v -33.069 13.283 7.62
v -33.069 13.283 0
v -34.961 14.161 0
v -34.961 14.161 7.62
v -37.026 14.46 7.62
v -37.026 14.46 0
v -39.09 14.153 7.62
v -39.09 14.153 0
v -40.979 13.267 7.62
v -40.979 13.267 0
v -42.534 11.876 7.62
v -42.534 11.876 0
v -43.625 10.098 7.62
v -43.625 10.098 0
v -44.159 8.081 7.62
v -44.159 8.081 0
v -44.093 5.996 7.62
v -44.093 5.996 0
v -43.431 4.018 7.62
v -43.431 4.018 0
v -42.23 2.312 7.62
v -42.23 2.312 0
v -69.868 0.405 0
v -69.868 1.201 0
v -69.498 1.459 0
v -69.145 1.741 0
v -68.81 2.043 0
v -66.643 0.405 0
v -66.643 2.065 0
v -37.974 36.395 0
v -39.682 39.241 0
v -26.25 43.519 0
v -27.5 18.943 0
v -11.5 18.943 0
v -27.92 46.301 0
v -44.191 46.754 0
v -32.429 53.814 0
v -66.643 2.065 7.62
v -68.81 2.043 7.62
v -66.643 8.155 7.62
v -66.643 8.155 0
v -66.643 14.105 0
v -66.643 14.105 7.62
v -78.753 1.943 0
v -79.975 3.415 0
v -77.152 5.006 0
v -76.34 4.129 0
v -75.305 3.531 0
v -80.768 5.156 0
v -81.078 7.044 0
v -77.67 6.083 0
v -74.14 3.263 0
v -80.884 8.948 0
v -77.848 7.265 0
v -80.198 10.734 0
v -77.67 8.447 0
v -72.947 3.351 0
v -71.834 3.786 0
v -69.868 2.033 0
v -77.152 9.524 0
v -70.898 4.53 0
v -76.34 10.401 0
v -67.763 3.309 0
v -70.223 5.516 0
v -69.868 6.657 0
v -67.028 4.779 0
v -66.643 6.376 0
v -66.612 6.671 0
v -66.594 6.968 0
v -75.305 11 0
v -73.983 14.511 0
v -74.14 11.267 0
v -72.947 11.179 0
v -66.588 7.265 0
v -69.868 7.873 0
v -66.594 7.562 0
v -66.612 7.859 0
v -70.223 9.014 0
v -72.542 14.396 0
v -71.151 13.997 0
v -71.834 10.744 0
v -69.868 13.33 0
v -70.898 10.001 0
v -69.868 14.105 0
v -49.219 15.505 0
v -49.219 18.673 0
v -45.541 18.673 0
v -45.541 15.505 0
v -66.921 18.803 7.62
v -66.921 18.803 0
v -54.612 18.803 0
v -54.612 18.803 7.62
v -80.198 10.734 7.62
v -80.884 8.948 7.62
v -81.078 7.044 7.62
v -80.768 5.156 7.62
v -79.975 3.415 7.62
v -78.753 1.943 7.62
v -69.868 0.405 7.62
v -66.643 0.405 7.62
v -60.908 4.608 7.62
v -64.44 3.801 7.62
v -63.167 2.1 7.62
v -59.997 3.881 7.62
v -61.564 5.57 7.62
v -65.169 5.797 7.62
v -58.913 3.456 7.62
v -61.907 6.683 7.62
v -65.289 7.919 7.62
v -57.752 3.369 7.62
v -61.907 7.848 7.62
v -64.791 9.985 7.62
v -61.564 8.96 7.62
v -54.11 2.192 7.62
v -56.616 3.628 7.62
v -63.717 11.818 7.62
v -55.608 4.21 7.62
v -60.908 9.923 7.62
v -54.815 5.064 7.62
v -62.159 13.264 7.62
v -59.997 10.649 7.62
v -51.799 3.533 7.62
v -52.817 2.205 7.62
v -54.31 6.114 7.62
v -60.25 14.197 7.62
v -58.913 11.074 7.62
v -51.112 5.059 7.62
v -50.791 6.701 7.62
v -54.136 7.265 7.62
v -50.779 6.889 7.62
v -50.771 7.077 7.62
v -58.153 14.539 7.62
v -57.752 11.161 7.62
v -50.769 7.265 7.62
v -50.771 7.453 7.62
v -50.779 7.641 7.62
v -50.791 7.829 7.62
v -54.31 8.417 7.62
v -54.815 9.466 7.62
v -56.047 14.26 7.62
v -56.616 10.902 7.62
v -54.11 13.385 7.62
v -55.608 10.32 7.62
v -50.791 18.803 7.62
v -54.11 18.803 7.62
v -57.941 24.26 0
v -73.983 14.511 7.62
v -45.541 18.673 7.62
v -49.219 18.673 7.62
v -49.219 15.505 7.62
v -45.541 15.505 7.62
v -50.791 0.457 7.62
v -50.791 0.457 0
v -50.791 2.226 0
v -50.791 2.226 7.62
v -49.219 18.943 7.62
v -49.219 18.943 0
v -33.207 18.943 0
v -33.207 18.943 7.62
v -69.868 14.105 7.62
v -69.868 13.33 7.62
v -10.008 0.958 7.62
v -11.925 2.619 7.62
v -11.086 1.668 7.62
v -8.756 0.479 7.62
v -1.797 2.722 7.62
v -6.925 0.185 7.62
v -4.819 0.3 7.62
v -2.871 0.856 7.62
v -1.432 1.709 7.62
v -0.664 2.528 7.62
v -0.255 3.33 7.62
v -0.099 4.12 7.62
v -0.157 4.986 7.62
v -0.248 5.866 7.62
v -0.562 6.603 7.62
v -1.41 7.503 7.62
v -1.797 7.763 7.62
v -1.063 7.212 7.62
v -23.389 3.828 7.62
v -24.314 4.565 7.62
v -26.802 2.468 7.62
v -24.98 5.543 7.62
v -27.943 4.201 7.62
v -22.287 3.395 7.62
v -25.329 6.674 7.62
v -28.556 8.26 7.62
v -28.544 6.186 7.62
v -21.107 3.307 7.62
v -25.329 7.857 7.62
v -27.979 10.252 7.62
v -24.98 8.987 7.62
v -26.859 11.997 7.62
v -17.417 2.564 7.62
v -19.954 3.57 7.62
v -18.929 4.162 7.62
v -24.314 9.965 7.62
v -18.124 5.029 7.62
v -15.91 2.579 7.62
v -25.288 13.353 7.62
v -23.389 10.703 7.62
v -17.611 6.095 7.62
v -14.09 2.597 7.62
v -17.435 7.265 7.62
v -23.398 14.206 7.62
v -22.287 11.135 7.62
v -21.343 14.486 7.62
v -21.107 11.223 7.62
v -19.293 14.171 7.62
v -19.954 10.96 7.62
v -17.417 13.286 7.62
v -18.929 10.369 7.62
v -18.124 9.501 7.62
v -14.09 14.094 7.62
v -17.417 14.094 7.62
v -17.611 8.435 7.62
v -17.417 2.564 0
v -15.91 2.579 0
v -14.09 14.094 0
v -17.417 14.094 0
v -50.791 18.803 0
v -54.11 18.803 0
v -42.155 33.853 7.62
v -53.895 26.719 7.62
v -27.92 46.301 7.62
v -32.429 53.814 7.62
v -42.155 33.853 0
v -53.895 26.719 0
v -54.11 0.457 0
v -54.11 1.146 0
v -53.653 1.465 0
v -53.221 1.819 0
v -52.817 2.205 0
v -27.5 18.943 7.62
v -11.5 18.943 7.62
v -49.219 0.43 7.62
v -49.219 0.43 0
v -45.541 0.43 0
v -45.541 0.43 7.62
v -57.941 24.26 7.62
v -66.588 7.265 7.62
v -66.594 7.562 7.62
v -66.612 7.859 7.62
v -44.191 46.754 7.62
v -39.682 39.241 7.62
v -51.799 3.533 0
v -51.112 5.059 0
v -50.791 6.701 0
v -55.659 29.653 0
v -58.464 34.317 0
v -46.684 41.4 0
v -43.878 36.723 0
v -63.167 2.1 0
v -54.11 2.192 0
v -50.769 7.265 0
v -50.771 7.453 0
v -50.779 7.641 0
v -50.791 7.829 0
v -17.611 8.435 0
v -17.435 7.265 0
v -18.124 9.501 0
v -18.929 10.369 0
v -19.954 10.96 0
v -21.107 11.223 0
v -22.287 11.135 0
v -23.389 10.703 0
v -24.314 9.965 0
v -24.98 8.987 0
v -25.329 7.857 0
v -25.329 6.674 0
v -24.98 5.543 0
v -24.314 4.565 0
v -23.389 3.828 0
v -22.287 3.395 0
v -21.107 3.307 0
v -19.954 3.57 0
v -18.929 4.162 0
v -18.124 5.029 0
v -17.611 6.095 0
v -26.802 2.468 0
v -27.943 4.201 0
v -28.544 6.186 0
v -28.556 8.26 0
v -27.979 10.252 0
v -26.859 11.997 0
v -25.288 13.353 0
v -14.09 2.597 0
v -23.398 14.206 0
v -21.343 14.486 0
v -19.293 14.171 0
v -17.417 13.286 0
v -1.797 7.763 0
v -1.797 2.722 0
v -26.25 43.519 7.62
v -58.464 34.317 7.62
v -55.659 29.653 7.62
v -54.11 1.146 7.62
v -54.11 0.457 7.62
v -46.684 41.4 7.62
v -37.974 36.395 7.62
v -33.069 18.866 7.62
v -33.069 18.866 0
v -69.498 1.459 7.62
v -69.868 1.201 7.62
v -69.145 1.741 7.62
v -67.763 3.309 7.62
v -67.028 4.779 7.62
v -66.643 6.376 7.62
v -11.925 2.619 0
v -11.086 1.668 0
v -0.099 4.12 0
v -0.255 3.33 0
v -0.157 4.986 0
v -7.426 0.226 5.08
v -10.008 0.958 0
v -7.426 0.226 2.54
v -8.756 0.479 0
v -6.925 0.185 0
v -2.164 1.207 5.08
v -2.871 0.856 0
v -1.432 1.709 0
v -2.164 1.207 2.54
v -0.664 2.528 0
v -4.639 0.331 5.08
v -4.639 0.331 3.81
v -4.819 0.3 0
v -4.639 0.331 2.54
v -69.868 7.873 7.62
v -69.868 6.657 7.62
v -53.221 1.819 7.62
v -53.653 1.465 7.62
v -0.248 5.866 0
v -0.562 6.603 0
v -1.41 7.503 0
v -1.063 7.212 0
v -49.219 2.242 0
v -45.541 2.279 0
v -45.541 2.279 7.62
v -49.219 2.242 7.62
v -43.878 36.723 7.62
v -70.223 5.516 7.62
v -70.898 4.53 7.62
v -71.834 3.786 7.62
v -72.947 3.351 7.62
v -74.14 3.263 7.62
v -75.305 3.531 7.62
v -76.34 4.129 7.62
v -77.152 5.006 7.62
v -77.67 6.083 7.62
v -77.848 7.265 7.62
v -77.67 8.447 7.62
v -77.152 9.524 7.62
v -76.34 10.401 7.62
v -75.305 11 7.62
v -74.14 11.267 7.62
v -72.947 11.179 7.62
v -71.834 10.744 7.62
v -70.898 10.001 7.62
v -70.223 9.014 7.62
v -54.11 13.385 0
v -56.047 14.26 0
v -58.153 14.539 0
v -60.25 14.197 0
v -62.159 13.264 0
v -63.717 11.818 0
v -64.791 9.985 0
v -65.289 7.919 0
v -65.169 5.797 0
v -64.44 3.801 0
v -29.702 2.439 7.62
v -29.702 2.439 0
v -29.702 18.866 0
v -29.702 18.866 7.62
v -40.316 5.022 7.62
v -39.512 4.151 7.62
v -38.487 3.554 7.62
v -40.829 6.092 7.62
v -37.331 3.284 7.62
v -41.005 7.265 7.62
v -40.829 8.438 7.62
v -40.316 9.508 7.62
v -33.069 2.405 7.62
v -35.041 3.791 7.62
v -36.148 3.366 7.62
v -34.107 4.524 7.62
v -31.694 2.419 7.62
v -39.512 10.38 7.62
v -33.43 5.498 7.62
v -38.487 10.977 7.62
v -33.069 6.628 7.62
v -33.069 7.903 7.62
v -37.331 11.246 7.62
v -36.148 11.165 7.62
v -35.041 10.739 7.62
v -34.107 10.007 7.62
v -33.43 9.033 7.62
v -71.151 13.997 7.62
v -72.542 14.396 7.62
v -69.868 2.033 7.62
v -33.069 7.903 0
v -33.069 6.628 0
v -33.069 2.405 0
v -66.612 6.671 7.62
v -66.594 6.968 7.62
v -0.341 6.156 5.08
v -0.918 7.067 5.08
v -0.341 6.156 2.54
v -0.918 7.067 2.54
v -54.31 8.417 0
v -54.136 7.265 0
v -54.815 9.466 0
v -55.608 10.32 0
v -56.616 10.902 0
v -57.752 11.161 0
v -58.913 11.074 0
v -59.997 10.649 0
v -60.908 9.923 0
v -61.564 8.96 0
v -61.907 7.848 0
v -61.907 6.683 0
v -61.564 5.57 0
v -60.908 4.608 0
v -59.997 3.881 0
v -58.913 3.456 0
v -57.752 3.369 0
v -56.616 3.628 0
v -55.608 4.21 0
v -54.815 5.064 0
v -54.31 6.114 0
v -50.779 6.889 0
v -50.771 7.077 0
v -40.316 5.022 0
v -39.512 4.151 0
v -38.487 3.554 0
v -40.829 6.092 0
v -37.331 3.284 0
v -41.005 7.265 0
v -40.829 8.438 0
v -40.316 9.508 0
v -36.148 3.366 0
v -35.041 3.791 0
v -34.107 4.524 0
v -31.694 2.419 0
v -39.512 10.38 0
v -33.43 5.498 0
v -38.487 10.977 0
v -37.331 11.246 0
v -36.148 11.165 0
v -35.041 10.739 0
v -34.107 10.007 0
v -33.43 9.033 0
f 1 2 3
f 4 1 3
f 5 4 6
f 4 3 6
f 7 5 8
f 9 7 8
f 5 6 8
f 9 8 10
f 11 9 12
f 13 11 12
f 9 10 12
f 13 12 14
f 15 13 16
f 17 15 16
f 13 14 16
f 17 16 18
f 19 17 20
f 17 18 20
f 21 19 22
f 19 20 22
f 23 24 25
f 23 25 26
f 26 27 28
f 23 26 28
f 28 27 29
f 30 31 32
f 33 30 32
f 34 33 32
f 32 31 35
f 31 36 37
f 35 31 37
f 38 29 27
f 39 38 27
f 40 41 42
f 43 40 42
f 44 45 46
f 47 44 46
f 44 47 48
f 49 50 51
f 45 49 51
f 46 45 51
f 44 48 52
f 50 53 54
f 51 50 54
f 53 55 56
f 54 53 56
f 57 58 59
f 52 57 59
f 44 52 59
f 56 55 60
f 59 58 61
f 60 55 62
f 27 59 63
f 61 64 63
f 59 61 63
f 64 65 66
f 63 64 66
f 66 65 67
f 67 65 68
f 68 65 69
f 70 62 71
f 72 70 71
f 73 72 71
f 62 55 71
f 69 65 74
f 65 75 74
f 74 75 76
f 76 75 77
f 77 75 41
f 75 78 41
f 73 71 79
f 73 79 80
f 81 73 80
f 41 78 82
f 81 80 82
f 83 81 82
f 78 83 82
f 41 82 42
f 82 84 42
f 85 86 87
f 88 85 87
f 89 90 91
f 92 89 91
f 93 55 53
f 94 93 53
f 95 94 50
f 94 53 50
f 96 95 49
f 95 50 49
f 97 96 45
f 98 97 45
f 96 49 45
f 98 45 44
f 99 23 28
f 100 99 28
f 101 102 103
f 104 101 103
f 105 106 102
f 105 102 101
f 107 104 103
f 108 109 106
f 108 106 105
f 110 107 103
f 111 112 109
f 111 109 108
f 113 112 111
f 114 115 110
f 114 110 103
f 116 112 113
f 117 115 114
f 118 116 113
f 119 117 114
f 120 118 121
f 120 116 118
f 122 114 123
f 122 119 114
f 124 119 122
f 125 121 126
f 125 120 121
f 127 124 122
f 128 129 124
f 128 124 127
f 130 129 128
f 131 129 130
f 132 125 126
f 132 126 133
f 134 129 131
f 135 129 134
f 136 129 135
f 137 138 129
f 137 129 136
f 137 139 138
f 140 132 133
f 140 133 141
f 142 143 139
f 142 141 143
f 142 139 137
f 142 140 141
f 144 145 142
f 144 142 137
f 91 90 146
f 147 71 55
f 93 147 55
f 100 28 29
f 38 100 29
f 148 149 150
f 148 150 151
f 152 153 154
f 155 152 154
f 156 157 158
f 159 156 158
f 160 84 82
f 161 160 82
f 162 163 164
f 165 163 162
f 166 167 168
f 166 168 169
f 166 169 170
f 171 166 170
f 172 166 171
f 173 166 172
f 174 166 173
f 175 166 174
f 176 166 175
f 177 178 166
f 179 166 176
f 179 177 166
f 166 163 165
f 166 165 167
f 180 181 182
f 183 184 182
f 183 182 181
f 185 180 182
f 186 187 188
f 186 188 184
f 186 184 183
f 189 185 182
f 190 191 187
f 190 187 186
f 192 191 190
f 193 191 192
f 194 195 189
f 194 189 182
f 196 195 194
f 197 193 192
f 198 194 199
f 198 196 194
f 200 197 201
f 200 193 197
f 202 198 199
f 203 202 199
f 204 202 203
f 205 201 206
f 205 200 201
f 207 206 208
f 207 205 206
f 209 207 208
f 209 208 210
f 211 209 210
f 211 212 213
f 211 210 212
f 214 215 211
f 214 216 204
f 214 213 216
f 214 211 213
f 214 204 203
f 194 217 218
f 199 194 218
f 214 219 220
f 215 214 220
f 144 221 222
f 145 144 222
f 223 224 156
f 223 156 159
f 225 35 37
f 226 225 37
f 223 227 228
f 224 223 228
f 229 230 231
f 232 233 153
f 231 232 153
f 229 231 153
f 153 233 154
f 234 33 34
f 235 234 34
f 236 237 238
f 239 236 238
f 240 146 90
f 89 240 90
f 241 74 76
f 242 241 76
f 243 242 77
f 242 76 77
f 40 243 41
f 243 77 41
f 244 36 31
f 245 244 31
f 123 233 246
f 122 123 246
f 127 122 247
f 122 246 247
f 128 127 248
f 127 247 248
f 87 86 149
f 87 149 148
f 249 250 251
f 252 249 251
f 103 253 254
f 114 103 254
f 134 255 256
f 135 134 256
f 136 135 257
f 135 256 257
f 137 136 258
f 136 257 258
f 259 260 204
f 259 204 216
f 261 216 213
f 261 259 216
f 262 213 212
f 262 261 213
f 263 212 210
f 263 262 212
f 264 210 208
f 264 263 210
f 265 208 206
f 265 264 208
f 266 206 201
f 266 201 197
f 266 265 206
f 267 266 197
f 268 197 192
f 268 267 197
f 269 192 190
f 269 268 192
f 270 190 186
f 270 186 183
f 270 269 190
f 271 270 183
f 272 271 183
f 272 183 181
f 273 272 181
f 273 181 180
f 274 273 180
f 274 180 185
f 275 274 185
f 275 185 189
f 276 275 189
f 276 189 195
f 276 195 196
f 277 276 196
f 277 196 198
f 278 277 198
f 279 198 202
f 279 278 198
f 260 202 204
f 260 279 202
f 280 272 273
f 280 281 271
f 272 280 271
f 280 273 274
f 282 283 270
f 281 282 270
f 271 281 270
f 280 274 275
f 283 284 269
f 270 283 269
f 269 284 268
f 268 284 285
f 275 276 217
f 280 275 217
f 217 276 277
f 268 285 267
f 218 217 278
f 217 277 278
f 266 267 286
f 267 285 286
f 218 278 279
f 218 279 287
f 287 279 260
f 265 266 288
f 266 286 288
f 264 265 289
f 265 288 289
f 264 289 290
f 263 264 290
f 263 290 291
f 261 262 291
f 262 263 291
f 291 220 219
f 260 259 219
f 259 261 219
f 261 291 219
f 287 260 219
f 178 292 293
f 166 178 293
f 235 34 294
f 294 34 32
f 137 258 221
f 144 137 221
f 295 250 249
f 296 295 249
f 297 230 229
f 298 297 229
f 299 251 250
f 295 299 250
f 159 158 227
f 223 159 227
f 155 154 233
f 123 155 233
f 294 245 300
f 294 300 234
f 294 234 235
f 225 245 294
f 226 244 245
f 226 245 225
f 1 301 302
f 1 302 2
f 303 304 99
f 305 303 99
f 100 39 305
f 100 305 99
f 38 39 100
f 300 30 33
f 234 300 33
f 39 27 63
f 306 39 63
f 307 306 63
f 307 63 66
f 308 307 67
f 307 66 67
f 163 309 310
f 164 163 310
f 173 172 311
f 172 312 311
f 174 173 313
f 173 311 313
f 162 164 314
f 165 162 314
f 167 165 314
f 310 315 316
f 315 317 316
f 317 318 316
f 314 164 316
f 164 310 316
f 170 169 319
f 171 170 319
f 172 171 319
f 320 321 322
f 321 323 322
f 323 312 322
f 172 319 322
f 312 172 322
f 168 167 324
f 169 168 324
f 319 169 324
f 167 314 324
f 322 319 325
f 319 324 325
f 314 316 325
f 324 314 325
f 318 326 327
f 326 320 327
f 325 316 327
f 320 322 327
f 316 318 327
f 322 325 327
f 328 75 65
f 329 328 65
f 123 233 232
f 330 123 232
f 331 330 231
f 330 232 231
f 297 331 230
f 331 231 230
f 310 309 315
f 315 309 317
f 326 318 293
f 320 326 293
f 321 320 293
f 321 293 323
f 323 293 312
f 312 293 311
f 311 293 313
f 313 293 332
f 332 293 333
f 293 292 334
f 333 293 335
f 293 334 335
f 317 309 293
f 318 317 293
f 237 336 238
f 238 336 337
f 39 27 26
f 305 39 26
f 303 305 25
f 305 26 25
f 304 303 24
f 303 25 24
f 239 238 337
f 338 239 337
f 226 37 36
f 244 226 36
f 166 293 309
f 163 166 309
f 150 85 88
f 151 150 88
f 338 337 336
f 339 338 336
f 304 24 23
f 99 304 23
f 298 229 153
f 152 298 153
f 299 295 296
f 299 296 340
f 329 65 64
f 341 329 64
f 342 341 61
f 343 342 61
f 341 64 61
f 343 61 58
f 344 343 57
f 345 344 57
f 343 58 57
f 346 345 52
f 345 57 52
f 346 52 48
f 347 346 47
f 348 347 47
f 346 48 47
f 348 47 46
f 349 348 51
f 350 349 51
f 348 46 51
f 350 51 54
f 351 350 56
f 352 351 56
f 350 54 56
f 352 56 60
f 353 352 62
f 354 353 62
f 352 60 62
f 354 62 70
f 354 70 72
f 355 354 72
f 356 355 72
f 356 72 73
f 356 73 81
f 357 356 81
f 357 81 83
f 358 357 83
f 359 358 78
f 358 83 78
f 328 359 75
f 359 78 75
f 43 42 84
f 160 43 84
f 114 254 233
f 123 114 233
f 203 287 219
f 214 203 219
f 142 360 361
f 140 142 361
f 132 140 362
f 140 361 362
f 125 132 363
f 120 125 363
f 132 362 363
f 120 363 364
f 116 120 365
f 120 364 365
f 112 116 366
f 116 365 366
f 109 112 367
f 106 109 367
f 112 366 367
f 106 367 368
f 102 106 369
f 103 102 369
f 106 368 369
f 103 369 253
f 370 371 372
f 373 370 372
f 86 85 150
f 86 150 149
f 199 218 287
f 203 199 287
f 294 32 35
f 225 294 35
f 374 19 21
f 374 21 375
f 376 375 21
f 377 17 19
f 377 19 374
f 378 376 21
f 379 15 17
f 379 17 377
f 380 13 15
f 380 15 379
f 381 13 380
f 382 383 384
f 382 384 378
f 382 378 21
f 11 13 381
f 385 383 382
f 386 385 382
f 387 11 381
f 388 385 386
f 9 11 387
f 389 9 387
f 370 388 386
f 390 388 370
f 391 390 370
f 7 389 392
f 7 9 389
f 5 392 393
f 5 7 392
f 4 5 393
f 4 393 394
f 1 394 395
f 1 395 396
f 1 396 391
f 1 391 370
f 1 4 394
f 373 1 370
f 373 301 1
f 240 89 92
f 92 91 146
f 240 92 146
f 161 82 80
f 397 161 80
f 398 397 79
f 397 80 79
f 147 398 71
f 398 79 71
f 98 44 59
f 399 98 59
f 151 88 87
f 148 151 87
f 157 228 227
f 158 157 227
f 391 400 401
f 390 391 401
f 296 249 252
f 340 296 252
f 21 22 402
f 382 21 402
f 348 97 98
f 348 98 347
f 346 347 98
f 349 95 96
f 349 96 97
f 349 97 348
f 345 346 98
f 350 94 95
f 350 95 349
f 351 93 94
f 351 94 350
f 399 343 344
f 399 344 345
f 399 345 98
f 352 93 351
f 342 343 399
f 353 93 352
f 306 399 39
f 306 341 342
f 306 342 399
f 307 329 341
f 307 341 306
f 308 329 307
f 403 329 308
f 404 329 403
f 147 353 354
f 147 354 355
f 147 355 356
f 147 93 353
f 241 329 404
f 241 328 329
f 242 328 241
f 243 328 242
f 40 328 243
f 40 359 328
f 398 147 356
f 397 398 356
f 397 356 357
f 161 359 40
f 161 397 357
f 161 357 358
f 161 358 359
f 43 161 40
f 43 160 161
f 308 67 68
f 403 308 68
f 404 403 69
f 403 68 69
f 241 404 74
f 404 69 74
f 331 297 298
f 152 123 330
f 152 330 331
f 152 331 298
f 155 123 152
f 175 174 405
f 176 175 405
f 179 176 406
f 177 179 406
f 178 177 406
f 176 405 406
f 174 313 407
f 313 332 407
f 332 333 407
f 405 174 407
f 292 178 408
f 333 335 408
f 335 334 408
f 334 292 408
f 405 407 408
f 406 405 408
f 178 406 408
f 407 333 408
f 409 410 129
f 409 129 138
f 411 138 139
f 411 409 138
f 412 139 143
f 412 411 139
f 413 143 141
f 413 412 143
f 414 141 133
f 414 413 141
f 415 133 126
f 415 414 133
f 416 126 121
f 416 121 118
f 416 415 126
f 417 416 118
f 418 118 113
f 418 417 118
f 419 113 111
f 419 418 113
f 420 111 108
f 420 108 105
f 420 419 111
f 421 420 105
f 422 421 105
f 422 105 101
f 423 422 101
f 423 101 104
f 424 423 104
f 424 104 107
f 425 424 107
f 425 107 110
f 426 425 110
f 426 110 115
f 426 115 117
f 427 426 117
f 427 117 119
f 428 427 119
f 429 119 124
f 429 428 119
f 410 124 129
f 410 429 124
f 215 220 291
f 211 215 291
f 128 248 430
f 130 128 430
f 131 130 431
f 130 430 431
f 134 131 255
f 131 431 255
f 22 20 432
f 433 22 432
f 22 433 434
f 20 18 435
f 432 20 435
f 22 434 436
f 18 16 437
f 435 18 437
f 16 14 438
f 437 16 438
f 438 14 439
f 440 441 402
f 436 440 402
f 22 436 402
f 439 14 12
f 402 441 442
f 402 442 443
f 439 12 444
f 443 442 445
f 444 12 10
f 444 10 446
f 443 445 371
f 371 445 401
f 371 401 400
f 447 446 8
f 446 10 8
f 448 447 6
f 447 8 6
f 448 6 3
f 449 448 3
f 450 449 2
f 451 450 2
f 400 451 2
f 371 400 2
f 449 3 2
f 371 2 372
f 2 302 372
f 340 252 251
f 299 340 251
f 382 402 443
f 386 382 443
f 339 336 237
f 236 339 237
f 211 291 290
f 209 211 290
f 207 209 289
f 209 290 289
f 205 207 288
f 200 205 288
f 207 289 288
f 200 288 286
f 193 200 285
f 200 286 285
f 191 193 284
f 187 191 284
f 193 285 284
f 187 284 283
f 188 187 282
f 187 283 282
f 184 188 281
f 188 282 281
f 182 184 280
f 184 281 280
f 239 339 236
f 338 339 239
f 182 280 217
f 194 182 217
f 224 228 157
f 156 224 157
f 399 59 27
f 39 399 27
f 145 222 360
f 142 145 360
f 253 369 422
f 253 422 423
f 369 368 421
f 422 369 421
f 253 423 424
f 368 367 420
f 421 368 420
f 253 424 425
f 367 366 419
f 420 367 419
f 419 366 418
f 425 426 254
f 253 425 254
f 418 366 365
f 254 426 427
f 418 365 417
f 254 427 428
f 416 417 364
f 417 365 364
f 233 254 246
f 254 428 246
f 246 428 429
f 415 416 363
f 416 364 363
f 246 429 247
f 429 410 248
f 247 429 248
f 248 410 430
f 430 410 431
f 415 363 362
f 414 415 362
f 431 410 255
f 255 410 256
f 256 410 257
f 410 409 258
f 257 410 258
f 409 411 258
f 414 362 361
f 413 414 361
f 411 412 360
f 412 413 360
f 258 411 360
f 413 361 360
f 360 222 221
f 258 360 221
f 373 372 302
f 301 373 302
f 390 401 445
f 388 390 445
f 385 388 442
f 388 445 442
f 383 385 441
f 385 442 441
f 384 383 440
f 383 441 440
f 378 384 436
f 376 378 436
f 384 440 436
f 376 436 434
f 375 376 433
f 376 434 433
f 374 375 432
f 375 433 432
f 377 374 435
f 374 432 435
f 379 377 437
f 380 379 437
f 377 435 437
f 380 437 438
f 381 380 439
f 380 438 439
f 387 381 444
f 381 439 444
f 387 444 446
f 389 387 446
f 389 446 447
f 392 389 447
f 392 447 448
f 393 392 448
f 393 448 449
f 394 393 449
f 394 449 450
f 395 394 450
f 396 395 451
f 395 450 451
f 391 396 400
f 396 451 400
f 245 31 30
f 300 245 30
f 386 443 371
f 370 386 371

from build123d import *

# Parameters (mm, degrees)
F1_DEPTH = 7.62
F0_R     = 3.9071612502
F0_R_2   = 3.9693222288
F0_W     = 3.6783010967
F0_H     = 3.1684441492


with BuildPart() as f1:
    # F0 (on Top) → F1 (new body)
    with BuildSketch(Plane.XY):
        Polygon((-54.6120963991, 18.8028495759), (-57.9414791113, 24.2596925711), (-66.9205742951, 18.8028495759), align=None)
    extrude(amount=F1_DEPTH)


with BuildPart() as f1b:
    # F0 (on Top) → F1, piece 2 (new body)
    with BuildSketch(Plane.XY):
        Polygon((-58.4635436535, 34.3171171844), (-55.6590456115, 29.6528524318), (-43.8780021033, 36.7234046998), (-46.6844625771, 41.399564594), align=None)
    extrude(amount=F1_DEPTH)


with BuildPart() as f1c:
    # F0 (on Top) → F1, piece 3 (new body)
    with BuildSketch(Plane.XY):
        Polygon((-42.1554631157, 33.8532884785), (-53.8949323829, 26.718890265), (-49.2192299373, 18.9425560391), (-33.2065857947, 18.9425560391), align=None)
    extrude(amount=F1_DEPTH)


with BuildPart() as f1d:
    # F0 (on Top) → F1, piece 4 (new body)
    with BuildSketch(Plane.XY):
        with BuildLine():
            ThreePointArc((-69.8677301407, 13.3297108985), (-71.8363877974, 14.2310348582), (-73.9834488266, 14.5105465515))
            Line((-73.9834488266, 14.5105465515), (-80.197720877, 10.7339625846))
            ThreePointArc((-80.197720877, 10.7339625846), (-80.9859151306, 6.0900592734), (-78.7530233725, 1.9426163816))
            Line((-78.7530233725, 1.9426163816), (-69.8677301407, 2.0325591908))
            Line((-69.8677301407, 2.0325591908), (-69.8677301407, 6.657484785))
            ThreePointArc((-69.8677301407, 6.657484785), (-77.8484436742, 7.2651901282), (-69.8677301407, 7.8728954714))
            Line((-69.8677301407, 7.8728954714), (-69.8677301407, 13.3297108985))
        make_face()
        with BuildLine():
            Line((-69.8677301407, 14.1047984362), (-69.8677301407, 13.3297108985))
            ThreePointArc((-69.8677301407, 13.3297108985), (-67.6845522307, 11.0979247886), (-66.6428804398, 8.1547878725))
            Line((-66.6428804398, 8.1547878725), (-66.6428804398, 14.1047984362))
            Line((-66.6428804398, 14.1047984362), (-69.8677301407, 14.1047984362))
        make_face()
        with BuildLine():
            ThreePointArc((-66.6428804398, 8.1547878725), (-67.6845522307, 11.0979247886), (-69.8677301407, 13.3297108985))
            Line((-69.8677301407, 13.3297108985), (-69.8677301407, 7.8728954714))
            ThreePointArc((-69.8677301407, 7.8728954714), (-69.833040775, 7.5699224451), (-69.821455358, 7.2651901282))
            ThreePointArc((-69.821455358, 7.2651901282), (-69.833040775, 6.9604578114), (-69.8677301407, 6.657484785))
            Line((-69.8677301407, 6.657484785), (-69.8677301407, 2.0325591908))
            Line((-69.8677301407, 2.0325591908), (-68.810137273, 2.0432648447))
            ThreePointArc((-68.810137273, 2.0432648447), (-67.3537989415, 4.0229796207), (-66.6428804398, 6.375592384))
            Line((-66.6428804398, 6.375592384), (-66.6428804398, 8.1547878725))
        make_face()
        with BuildLine():
            ThreePointArc((-66.5880714472, 7.2651901282), (-66.6017866739, 7.7108324097), (-66.6428804398, 8.1547878725))
            Line((-66.6428804398, 8.1547878725), (-66.6428804398, 6.375592384))
            ThreePointArc((-66.6428804398, 6.375592384), (-66.6017866739, 6.8195478467), (-66.5880714472, 7.2651901282))
        make_face()
        with BuildLine():
            ThreePointArc((-69.821455358, 7.2651901282), (-69.833040775, 7.5699224451), (-69.8677301407, 7.8728954714))
            Line((-69.8677301407, 7.8728954714), (-69.8677301407, 6.657484785))
            ThreePointArc((-69.8677301407, 6.657484785), (-69.833040775, 6.9604578114), (-69.821455358, 7.2651901282))
        make_face()
    extrude(amount=F1_DEPTH)


with BuildPart() as f1e:
    # F0 (on Top) → F1, piece 5 (new body)
    with BuildSketch(Plane.XY):
        Polygon((-27.9197386264, 46.3009719113), (-39.6823539035, 39.2414795949), (-37.9737712473, 36.3946175894), (-26.25028293, 43.5193037403), align=None)
        Polygon((-44.1911518574, 46.7540957034), (-39.6823539035, 39.2414795949), (-27.9197386264, 46.3009719113), (-32.4285365804, 53.8135880197), align=None)
        Polygon((-26.25028293, 43.5193037403), (-37.9737712473, 36.3946175894), (-27.4996809606, 18.9425560391), (-11.5002160892, 18.9425560391), align=None)
    extrude(amount=F1_DEPTH)


with BuildPart() as f1f:
    # F0 (on Top) → F1, piece 6 (new body)
    with BuildSketch(Plane.XY):
        with BuildLine():
            ThreePointArc((-54.1104190052, 13.3848092535), (-63.7170999248, 11.8183650375), (-63.1665728512, 2.1003927329))
            Line((-63.1665728512, 2.1003927329), (-54.1104190052, 2.1920651062))
            Line((-54.1104190052, 2.1920651062), (-54.1104190052, 13.3848092535))
        make_face()
        with Locations((-58.0436183297, 7.2651901282)):
            Circle(F0_R, mode=Mode.SUBTRACT)
        with BuildLine():
            Line((-54.1104190052, 18.8028495759), (-54.1104190052, 13.3848092535))
            ThreePointArc((-54.1104190052, 13.3848092535), (-51.7988275156, 10.9964610717), (-50.790913403, 7.8291638969))
            Line((-50.790913403, 7.8291638969), (-50.790913403, 18.8028495759))
            Line((-50.790913403, 18.8028495759), (-54.1104190052, 18.8028495759))
        make_face()
        with BuildLine():
            ThreePointArc((-50.790913403, 7.8291638969), (-51.7988275156, 10.9964610717), (-54.1104190052, 13.3848092535))
            Line((-54.1104190052, 13.3848092535), (-54.1104190052, 2.1920651062))
            Line((-54.1104190052, 2.1920651062), (-52.8171613103, 2.2051563151))
            ThreePointArc((-52.8171613103, 2.2051563151), (-51.4114233914, 4.276246257), (-50.790913403, 6.7012163595))
            Line((-50.790913403, 6.7012163595), (-50.790913403, 7.8291638969))
        make_face()
        with BuildLine():
            ThreePointArc((-50.7690190167, 7.2651901282), (-50.7744946741, 7.5473894266), (-50.790913403, 7.8291638969))
            Line((-50.790913403, 7.8291638969), (-50.790913403, 6.7012163595))
            ThreePointArc((-50.790913403, 6.7012163595), (-50.7744946741, 6.9829908299), (-50.7690190167, 7.2651901282))
        make_face()
    extrude(amount=F1_DEPTH)


with BuildPart() as f1g:
    # F0 (on Top) → F1, piece 7 (new body)
    with BuildSketch(Plane.XY):
        with BuildLine():
            ThreePointArc((-52.8171613103, 2.2051563151), (-53.433248893, 1.6380870705), (-54.1104190052, 1.145571003))
            Line((-54.1104190052, 1.145571003), (-54.1104190052, 0.4571469035))
            Line((-54.1104190052, 0.4571469035), (-50.790913403, 0.4571469035))
            Line((-50.790913403, 0.4571469035), (-50.790913403, 2.2256673353))
            Line((-50.790913403, 2.2256673353), (-52.8171613103, 2.2051563151))
        make_face()
    extrude(amount=F1_DEPTH)


with BuildPart() as f1h:
    # F0 (on Top) → F1, piece 8 (new body)
    with BuildSketch(Plane.XY):
        with BuildLine():
            ThreePointArc((-68.810137273, 2.0432648447), (-69.319238061, 1.5972458978), (-69.8677301407, 1.200669358))
            Line((-69.8677301407, 1.200669358), (-69.8677301407, 0.4053486628))
            Line((-69.8677301407, 0.4053486628), (-66.6428804398, 0.4053486628))
            Line((-66.6428804398, 0.4053486628), (-66.6428804398, 2.0652032504))
            Line((-66.6428804398, 2.0652032504), (-68.810137273, 2.0432648447))
        make_face()
    extrude(amount=F1_DEPTH)


with BuildPart() as f1i:
    # F0 (on Top) → F1, piece 9 (new body)
    with BuildSketch(Plane.XY):
        Polygon((-45.5409288406, 2.2788111481), (-49.2192299373, 2.2415769539), (-49.2192299373, 0.4300079017), (-45.5409288406, 0.4300079017), align=None)
    extrude(amount=F1_DEPTH)


with BuildPart() as f1j:
    # F0 (on Top) → F1, piece 10 (new body)
    with BuildSketch(Plane.XY):
        with BuildLine():
            add(Edge.make_bspline(
                [(-0.1574168564, 4.985621199), (-0.1131827791, 6.2999939449), (-0.7987933683, 7.1600216499), (-1.7971183406, 7.7627462702)],
                knots=[0, 0, 0, 0, 2.8581671617, 2.8581671617, 2.8581671617, 2.8581671617], degree=3))
            Line((-1.7971183406, 7.7627462702), (-1.7971183406, 2.7216149028))
            Line((-1.7971183406, 2.7216149028), (-11.9253362085, 2.6190903891))
            add(Edge.make_bspline(
                [(-11.9253362085, 2.6190903891), (-9.1467564623, -1.6533627287), (0.8026806645, 0.0011403924), (-0.1574168564, 4.985621199)],
                knots=[1.6292148337, 1.6292148337, 1.6292148337, 1.6292148337, 12.4734198375, 12.4734198375, 12.4734198375, 12.4734198375], degree=3))
        make_face()
    extrude(amount=F1_DEPTH)


with BuildPart() as f1k:
    # F0 (on Top) → F1, piece 11 (new body)
    with BuildSketch(Plane.XY):
        with BuildLine():
            ThreePointArc((-33.0688804388, 13.2829963894), (-42.5337962649, 11.8763615852), (-42.229529747, 2.3123313179))
            Line((-42.229529747, 2.3123313179), (-33.0688804388, 2.4050614633))
            Line((-33.0688804388, 2.4050614633), (-33.0688804388, 6.6275104705))
            ThreePointArc((-33.0688804388, 6.6275104705), (-41.0053996041, 7.2651901282), (-33.0688804388, 7.902869786))
            Line((-33.0688804388, 7.902869786), (-33.0688804388, 13.2829963894))
        make_face()
        with BuildLine():
            Line((-33.0688804388, 18.8656765968), (-33.0688804388, 13.2829963894))
            ThreePointArc((-33.0688804388, 13.2829963894), (-30.6821030987, 10.6852589728), (-29.8171898923, 7.2651901282))
            ThreePointArc((-29.8171898923, 7.2651901282), (-30.3028664009, 4.6666608213), (-31.6943216201, 2.4189756559))
            Line((-31.6943216201, 2.4189756559), (-29.7021493316, 2.4391417402))
            Line((-29.7021493316, 2.4391417402), (-29.7021493316, 18.8656765968))
            Line((-29.7021493316, 18.8656765968), (-33.0688804388, 18.8656765968))
        make_face()
        with BuildLine():
            ThreePointArc((-29.8171898923, 7.2651901282), (-30.6821030987, 10.6852589728), (-33.0688804388, 13.2829963894))
            Line((-33.0688804388, 13.2829963894), (-33.0688804388, 7.902869786))
            ThreePointArc((-33.0688804388, 7.902869786), (-33.0304740594, 7.5850574725), (-33.0176444577, 7.2651901282))
            ThreePointArc((-33.0176444577, 7.2651901282), (-33.0304740594, 6.945322784), (-33.0688804388, 6.6275104705))
            Line((-33.0688804388, 6.6275104705), (-33.0688804388, 2.4050614633))
            Line((-33.0688804388, 2.4050614633), (-31.6943216201, 2.4189756559))
            ThreePointArc((-31.6943216201, 2.4189756559), (-30.3028664009, 4.6666608213), (-29.8171898923, 7.2651901282))
        make_face()
        with BuildLine():
            ThreePointArc((-33.0176444577, 7.2651901282), (-33.0304740594, 7.5850574725), (-33.0688804388, 7.902869786))
            Line((-33.0688804388, 7.902869786), (-33.0688804388, 6.6275104705))
            ThreePointArc((-33.0688804388, 6.6275104705), (-33.0304740594, 6.945322784), (-33.0176444577, 7.2651901282))
        make_face()
    extrude(amount=F1_DEPTH)


with BuildPart() as f1l:
    # F0 (on Top) → F1, piece 12 (new body)
    with BuildSketch(Plane.XY):
        with BuildLine():
            Line((-15.9099875813, 2.578755115), (-14.0899363905, 2.5971788758))
            Line((-14.0899363905, 2.5971788758), (-14.0899363905, 14.0935815871))
            Line((-14.0899363905, 14.0935815871), (-17.416972667, 14.0935815871))
            Line((-17.416972667, 14.0935815871), (-17.416972667, 13.2860199104))
            ThreePointArc((-17.416972667, 13.2860199104), (-15.0424605066, 10.6824550648), (-14.182717371, 7.2651901282))
            ThreePointArc((-14.182717371, 7.2651901282), (-14.628280923, 4.7678848048), (-15.9099875813, 2.578755115))
        make_face()
        with BuildLine():
            Line((-17.416972667, 2.5635004161), (-15.9099875813, 2.578755115))
            ThreePointArc((-15.9099875813, 2.578755115), (-14.628280923, 4.7678848048), (-14.182717371, 7.2651901282))
            ThreePointArc((-14.182717371, 7.2651901282), (-15.0424605066, 10.6824550648), (-17.416972667, 13.2860199104))
            Line((-17.416972667, 13.2860199104), (-17.416972667, 2.5635004161))
        make_face()
        with BuildLine():
            ThreePointArc((-17.416972667, 13.2860199104), (-26.8585548081, 11.997439908), (-26.8019732469, 2.4684992389))
            Line((-26.8019732469, 2.4684992389), (-17.416972667, 2.5635004161))
            Line((-17.416972667, 2.5635004161), (-17.416972667, 13.2860199104))
        make_face()
        with Locations((-21.4039776474, 7.2651901282)):
            Circle(F0_R_2, mode=Mode.SUBTRACT)
    extrude(amount=F1_DEPTH)


with BuildPart() as f1m:
    # F0 (on Top) → F1, piece 13 (new body)
    with BuildSketch(Plane.XY):
        with Locations((-47.380079389, 17.0888998546)):
            Rectangle(F0_W, F0_H)
    extrude(amount=F1_DEPTH)


solid = Compound([f1.part, f1b.part, f1c.part, f1d.part, f1e.part, f1f.part, f1g.part, f1h.part, f1i.part, f1j.part, f1k.part, f1l.part, f1m.part])
